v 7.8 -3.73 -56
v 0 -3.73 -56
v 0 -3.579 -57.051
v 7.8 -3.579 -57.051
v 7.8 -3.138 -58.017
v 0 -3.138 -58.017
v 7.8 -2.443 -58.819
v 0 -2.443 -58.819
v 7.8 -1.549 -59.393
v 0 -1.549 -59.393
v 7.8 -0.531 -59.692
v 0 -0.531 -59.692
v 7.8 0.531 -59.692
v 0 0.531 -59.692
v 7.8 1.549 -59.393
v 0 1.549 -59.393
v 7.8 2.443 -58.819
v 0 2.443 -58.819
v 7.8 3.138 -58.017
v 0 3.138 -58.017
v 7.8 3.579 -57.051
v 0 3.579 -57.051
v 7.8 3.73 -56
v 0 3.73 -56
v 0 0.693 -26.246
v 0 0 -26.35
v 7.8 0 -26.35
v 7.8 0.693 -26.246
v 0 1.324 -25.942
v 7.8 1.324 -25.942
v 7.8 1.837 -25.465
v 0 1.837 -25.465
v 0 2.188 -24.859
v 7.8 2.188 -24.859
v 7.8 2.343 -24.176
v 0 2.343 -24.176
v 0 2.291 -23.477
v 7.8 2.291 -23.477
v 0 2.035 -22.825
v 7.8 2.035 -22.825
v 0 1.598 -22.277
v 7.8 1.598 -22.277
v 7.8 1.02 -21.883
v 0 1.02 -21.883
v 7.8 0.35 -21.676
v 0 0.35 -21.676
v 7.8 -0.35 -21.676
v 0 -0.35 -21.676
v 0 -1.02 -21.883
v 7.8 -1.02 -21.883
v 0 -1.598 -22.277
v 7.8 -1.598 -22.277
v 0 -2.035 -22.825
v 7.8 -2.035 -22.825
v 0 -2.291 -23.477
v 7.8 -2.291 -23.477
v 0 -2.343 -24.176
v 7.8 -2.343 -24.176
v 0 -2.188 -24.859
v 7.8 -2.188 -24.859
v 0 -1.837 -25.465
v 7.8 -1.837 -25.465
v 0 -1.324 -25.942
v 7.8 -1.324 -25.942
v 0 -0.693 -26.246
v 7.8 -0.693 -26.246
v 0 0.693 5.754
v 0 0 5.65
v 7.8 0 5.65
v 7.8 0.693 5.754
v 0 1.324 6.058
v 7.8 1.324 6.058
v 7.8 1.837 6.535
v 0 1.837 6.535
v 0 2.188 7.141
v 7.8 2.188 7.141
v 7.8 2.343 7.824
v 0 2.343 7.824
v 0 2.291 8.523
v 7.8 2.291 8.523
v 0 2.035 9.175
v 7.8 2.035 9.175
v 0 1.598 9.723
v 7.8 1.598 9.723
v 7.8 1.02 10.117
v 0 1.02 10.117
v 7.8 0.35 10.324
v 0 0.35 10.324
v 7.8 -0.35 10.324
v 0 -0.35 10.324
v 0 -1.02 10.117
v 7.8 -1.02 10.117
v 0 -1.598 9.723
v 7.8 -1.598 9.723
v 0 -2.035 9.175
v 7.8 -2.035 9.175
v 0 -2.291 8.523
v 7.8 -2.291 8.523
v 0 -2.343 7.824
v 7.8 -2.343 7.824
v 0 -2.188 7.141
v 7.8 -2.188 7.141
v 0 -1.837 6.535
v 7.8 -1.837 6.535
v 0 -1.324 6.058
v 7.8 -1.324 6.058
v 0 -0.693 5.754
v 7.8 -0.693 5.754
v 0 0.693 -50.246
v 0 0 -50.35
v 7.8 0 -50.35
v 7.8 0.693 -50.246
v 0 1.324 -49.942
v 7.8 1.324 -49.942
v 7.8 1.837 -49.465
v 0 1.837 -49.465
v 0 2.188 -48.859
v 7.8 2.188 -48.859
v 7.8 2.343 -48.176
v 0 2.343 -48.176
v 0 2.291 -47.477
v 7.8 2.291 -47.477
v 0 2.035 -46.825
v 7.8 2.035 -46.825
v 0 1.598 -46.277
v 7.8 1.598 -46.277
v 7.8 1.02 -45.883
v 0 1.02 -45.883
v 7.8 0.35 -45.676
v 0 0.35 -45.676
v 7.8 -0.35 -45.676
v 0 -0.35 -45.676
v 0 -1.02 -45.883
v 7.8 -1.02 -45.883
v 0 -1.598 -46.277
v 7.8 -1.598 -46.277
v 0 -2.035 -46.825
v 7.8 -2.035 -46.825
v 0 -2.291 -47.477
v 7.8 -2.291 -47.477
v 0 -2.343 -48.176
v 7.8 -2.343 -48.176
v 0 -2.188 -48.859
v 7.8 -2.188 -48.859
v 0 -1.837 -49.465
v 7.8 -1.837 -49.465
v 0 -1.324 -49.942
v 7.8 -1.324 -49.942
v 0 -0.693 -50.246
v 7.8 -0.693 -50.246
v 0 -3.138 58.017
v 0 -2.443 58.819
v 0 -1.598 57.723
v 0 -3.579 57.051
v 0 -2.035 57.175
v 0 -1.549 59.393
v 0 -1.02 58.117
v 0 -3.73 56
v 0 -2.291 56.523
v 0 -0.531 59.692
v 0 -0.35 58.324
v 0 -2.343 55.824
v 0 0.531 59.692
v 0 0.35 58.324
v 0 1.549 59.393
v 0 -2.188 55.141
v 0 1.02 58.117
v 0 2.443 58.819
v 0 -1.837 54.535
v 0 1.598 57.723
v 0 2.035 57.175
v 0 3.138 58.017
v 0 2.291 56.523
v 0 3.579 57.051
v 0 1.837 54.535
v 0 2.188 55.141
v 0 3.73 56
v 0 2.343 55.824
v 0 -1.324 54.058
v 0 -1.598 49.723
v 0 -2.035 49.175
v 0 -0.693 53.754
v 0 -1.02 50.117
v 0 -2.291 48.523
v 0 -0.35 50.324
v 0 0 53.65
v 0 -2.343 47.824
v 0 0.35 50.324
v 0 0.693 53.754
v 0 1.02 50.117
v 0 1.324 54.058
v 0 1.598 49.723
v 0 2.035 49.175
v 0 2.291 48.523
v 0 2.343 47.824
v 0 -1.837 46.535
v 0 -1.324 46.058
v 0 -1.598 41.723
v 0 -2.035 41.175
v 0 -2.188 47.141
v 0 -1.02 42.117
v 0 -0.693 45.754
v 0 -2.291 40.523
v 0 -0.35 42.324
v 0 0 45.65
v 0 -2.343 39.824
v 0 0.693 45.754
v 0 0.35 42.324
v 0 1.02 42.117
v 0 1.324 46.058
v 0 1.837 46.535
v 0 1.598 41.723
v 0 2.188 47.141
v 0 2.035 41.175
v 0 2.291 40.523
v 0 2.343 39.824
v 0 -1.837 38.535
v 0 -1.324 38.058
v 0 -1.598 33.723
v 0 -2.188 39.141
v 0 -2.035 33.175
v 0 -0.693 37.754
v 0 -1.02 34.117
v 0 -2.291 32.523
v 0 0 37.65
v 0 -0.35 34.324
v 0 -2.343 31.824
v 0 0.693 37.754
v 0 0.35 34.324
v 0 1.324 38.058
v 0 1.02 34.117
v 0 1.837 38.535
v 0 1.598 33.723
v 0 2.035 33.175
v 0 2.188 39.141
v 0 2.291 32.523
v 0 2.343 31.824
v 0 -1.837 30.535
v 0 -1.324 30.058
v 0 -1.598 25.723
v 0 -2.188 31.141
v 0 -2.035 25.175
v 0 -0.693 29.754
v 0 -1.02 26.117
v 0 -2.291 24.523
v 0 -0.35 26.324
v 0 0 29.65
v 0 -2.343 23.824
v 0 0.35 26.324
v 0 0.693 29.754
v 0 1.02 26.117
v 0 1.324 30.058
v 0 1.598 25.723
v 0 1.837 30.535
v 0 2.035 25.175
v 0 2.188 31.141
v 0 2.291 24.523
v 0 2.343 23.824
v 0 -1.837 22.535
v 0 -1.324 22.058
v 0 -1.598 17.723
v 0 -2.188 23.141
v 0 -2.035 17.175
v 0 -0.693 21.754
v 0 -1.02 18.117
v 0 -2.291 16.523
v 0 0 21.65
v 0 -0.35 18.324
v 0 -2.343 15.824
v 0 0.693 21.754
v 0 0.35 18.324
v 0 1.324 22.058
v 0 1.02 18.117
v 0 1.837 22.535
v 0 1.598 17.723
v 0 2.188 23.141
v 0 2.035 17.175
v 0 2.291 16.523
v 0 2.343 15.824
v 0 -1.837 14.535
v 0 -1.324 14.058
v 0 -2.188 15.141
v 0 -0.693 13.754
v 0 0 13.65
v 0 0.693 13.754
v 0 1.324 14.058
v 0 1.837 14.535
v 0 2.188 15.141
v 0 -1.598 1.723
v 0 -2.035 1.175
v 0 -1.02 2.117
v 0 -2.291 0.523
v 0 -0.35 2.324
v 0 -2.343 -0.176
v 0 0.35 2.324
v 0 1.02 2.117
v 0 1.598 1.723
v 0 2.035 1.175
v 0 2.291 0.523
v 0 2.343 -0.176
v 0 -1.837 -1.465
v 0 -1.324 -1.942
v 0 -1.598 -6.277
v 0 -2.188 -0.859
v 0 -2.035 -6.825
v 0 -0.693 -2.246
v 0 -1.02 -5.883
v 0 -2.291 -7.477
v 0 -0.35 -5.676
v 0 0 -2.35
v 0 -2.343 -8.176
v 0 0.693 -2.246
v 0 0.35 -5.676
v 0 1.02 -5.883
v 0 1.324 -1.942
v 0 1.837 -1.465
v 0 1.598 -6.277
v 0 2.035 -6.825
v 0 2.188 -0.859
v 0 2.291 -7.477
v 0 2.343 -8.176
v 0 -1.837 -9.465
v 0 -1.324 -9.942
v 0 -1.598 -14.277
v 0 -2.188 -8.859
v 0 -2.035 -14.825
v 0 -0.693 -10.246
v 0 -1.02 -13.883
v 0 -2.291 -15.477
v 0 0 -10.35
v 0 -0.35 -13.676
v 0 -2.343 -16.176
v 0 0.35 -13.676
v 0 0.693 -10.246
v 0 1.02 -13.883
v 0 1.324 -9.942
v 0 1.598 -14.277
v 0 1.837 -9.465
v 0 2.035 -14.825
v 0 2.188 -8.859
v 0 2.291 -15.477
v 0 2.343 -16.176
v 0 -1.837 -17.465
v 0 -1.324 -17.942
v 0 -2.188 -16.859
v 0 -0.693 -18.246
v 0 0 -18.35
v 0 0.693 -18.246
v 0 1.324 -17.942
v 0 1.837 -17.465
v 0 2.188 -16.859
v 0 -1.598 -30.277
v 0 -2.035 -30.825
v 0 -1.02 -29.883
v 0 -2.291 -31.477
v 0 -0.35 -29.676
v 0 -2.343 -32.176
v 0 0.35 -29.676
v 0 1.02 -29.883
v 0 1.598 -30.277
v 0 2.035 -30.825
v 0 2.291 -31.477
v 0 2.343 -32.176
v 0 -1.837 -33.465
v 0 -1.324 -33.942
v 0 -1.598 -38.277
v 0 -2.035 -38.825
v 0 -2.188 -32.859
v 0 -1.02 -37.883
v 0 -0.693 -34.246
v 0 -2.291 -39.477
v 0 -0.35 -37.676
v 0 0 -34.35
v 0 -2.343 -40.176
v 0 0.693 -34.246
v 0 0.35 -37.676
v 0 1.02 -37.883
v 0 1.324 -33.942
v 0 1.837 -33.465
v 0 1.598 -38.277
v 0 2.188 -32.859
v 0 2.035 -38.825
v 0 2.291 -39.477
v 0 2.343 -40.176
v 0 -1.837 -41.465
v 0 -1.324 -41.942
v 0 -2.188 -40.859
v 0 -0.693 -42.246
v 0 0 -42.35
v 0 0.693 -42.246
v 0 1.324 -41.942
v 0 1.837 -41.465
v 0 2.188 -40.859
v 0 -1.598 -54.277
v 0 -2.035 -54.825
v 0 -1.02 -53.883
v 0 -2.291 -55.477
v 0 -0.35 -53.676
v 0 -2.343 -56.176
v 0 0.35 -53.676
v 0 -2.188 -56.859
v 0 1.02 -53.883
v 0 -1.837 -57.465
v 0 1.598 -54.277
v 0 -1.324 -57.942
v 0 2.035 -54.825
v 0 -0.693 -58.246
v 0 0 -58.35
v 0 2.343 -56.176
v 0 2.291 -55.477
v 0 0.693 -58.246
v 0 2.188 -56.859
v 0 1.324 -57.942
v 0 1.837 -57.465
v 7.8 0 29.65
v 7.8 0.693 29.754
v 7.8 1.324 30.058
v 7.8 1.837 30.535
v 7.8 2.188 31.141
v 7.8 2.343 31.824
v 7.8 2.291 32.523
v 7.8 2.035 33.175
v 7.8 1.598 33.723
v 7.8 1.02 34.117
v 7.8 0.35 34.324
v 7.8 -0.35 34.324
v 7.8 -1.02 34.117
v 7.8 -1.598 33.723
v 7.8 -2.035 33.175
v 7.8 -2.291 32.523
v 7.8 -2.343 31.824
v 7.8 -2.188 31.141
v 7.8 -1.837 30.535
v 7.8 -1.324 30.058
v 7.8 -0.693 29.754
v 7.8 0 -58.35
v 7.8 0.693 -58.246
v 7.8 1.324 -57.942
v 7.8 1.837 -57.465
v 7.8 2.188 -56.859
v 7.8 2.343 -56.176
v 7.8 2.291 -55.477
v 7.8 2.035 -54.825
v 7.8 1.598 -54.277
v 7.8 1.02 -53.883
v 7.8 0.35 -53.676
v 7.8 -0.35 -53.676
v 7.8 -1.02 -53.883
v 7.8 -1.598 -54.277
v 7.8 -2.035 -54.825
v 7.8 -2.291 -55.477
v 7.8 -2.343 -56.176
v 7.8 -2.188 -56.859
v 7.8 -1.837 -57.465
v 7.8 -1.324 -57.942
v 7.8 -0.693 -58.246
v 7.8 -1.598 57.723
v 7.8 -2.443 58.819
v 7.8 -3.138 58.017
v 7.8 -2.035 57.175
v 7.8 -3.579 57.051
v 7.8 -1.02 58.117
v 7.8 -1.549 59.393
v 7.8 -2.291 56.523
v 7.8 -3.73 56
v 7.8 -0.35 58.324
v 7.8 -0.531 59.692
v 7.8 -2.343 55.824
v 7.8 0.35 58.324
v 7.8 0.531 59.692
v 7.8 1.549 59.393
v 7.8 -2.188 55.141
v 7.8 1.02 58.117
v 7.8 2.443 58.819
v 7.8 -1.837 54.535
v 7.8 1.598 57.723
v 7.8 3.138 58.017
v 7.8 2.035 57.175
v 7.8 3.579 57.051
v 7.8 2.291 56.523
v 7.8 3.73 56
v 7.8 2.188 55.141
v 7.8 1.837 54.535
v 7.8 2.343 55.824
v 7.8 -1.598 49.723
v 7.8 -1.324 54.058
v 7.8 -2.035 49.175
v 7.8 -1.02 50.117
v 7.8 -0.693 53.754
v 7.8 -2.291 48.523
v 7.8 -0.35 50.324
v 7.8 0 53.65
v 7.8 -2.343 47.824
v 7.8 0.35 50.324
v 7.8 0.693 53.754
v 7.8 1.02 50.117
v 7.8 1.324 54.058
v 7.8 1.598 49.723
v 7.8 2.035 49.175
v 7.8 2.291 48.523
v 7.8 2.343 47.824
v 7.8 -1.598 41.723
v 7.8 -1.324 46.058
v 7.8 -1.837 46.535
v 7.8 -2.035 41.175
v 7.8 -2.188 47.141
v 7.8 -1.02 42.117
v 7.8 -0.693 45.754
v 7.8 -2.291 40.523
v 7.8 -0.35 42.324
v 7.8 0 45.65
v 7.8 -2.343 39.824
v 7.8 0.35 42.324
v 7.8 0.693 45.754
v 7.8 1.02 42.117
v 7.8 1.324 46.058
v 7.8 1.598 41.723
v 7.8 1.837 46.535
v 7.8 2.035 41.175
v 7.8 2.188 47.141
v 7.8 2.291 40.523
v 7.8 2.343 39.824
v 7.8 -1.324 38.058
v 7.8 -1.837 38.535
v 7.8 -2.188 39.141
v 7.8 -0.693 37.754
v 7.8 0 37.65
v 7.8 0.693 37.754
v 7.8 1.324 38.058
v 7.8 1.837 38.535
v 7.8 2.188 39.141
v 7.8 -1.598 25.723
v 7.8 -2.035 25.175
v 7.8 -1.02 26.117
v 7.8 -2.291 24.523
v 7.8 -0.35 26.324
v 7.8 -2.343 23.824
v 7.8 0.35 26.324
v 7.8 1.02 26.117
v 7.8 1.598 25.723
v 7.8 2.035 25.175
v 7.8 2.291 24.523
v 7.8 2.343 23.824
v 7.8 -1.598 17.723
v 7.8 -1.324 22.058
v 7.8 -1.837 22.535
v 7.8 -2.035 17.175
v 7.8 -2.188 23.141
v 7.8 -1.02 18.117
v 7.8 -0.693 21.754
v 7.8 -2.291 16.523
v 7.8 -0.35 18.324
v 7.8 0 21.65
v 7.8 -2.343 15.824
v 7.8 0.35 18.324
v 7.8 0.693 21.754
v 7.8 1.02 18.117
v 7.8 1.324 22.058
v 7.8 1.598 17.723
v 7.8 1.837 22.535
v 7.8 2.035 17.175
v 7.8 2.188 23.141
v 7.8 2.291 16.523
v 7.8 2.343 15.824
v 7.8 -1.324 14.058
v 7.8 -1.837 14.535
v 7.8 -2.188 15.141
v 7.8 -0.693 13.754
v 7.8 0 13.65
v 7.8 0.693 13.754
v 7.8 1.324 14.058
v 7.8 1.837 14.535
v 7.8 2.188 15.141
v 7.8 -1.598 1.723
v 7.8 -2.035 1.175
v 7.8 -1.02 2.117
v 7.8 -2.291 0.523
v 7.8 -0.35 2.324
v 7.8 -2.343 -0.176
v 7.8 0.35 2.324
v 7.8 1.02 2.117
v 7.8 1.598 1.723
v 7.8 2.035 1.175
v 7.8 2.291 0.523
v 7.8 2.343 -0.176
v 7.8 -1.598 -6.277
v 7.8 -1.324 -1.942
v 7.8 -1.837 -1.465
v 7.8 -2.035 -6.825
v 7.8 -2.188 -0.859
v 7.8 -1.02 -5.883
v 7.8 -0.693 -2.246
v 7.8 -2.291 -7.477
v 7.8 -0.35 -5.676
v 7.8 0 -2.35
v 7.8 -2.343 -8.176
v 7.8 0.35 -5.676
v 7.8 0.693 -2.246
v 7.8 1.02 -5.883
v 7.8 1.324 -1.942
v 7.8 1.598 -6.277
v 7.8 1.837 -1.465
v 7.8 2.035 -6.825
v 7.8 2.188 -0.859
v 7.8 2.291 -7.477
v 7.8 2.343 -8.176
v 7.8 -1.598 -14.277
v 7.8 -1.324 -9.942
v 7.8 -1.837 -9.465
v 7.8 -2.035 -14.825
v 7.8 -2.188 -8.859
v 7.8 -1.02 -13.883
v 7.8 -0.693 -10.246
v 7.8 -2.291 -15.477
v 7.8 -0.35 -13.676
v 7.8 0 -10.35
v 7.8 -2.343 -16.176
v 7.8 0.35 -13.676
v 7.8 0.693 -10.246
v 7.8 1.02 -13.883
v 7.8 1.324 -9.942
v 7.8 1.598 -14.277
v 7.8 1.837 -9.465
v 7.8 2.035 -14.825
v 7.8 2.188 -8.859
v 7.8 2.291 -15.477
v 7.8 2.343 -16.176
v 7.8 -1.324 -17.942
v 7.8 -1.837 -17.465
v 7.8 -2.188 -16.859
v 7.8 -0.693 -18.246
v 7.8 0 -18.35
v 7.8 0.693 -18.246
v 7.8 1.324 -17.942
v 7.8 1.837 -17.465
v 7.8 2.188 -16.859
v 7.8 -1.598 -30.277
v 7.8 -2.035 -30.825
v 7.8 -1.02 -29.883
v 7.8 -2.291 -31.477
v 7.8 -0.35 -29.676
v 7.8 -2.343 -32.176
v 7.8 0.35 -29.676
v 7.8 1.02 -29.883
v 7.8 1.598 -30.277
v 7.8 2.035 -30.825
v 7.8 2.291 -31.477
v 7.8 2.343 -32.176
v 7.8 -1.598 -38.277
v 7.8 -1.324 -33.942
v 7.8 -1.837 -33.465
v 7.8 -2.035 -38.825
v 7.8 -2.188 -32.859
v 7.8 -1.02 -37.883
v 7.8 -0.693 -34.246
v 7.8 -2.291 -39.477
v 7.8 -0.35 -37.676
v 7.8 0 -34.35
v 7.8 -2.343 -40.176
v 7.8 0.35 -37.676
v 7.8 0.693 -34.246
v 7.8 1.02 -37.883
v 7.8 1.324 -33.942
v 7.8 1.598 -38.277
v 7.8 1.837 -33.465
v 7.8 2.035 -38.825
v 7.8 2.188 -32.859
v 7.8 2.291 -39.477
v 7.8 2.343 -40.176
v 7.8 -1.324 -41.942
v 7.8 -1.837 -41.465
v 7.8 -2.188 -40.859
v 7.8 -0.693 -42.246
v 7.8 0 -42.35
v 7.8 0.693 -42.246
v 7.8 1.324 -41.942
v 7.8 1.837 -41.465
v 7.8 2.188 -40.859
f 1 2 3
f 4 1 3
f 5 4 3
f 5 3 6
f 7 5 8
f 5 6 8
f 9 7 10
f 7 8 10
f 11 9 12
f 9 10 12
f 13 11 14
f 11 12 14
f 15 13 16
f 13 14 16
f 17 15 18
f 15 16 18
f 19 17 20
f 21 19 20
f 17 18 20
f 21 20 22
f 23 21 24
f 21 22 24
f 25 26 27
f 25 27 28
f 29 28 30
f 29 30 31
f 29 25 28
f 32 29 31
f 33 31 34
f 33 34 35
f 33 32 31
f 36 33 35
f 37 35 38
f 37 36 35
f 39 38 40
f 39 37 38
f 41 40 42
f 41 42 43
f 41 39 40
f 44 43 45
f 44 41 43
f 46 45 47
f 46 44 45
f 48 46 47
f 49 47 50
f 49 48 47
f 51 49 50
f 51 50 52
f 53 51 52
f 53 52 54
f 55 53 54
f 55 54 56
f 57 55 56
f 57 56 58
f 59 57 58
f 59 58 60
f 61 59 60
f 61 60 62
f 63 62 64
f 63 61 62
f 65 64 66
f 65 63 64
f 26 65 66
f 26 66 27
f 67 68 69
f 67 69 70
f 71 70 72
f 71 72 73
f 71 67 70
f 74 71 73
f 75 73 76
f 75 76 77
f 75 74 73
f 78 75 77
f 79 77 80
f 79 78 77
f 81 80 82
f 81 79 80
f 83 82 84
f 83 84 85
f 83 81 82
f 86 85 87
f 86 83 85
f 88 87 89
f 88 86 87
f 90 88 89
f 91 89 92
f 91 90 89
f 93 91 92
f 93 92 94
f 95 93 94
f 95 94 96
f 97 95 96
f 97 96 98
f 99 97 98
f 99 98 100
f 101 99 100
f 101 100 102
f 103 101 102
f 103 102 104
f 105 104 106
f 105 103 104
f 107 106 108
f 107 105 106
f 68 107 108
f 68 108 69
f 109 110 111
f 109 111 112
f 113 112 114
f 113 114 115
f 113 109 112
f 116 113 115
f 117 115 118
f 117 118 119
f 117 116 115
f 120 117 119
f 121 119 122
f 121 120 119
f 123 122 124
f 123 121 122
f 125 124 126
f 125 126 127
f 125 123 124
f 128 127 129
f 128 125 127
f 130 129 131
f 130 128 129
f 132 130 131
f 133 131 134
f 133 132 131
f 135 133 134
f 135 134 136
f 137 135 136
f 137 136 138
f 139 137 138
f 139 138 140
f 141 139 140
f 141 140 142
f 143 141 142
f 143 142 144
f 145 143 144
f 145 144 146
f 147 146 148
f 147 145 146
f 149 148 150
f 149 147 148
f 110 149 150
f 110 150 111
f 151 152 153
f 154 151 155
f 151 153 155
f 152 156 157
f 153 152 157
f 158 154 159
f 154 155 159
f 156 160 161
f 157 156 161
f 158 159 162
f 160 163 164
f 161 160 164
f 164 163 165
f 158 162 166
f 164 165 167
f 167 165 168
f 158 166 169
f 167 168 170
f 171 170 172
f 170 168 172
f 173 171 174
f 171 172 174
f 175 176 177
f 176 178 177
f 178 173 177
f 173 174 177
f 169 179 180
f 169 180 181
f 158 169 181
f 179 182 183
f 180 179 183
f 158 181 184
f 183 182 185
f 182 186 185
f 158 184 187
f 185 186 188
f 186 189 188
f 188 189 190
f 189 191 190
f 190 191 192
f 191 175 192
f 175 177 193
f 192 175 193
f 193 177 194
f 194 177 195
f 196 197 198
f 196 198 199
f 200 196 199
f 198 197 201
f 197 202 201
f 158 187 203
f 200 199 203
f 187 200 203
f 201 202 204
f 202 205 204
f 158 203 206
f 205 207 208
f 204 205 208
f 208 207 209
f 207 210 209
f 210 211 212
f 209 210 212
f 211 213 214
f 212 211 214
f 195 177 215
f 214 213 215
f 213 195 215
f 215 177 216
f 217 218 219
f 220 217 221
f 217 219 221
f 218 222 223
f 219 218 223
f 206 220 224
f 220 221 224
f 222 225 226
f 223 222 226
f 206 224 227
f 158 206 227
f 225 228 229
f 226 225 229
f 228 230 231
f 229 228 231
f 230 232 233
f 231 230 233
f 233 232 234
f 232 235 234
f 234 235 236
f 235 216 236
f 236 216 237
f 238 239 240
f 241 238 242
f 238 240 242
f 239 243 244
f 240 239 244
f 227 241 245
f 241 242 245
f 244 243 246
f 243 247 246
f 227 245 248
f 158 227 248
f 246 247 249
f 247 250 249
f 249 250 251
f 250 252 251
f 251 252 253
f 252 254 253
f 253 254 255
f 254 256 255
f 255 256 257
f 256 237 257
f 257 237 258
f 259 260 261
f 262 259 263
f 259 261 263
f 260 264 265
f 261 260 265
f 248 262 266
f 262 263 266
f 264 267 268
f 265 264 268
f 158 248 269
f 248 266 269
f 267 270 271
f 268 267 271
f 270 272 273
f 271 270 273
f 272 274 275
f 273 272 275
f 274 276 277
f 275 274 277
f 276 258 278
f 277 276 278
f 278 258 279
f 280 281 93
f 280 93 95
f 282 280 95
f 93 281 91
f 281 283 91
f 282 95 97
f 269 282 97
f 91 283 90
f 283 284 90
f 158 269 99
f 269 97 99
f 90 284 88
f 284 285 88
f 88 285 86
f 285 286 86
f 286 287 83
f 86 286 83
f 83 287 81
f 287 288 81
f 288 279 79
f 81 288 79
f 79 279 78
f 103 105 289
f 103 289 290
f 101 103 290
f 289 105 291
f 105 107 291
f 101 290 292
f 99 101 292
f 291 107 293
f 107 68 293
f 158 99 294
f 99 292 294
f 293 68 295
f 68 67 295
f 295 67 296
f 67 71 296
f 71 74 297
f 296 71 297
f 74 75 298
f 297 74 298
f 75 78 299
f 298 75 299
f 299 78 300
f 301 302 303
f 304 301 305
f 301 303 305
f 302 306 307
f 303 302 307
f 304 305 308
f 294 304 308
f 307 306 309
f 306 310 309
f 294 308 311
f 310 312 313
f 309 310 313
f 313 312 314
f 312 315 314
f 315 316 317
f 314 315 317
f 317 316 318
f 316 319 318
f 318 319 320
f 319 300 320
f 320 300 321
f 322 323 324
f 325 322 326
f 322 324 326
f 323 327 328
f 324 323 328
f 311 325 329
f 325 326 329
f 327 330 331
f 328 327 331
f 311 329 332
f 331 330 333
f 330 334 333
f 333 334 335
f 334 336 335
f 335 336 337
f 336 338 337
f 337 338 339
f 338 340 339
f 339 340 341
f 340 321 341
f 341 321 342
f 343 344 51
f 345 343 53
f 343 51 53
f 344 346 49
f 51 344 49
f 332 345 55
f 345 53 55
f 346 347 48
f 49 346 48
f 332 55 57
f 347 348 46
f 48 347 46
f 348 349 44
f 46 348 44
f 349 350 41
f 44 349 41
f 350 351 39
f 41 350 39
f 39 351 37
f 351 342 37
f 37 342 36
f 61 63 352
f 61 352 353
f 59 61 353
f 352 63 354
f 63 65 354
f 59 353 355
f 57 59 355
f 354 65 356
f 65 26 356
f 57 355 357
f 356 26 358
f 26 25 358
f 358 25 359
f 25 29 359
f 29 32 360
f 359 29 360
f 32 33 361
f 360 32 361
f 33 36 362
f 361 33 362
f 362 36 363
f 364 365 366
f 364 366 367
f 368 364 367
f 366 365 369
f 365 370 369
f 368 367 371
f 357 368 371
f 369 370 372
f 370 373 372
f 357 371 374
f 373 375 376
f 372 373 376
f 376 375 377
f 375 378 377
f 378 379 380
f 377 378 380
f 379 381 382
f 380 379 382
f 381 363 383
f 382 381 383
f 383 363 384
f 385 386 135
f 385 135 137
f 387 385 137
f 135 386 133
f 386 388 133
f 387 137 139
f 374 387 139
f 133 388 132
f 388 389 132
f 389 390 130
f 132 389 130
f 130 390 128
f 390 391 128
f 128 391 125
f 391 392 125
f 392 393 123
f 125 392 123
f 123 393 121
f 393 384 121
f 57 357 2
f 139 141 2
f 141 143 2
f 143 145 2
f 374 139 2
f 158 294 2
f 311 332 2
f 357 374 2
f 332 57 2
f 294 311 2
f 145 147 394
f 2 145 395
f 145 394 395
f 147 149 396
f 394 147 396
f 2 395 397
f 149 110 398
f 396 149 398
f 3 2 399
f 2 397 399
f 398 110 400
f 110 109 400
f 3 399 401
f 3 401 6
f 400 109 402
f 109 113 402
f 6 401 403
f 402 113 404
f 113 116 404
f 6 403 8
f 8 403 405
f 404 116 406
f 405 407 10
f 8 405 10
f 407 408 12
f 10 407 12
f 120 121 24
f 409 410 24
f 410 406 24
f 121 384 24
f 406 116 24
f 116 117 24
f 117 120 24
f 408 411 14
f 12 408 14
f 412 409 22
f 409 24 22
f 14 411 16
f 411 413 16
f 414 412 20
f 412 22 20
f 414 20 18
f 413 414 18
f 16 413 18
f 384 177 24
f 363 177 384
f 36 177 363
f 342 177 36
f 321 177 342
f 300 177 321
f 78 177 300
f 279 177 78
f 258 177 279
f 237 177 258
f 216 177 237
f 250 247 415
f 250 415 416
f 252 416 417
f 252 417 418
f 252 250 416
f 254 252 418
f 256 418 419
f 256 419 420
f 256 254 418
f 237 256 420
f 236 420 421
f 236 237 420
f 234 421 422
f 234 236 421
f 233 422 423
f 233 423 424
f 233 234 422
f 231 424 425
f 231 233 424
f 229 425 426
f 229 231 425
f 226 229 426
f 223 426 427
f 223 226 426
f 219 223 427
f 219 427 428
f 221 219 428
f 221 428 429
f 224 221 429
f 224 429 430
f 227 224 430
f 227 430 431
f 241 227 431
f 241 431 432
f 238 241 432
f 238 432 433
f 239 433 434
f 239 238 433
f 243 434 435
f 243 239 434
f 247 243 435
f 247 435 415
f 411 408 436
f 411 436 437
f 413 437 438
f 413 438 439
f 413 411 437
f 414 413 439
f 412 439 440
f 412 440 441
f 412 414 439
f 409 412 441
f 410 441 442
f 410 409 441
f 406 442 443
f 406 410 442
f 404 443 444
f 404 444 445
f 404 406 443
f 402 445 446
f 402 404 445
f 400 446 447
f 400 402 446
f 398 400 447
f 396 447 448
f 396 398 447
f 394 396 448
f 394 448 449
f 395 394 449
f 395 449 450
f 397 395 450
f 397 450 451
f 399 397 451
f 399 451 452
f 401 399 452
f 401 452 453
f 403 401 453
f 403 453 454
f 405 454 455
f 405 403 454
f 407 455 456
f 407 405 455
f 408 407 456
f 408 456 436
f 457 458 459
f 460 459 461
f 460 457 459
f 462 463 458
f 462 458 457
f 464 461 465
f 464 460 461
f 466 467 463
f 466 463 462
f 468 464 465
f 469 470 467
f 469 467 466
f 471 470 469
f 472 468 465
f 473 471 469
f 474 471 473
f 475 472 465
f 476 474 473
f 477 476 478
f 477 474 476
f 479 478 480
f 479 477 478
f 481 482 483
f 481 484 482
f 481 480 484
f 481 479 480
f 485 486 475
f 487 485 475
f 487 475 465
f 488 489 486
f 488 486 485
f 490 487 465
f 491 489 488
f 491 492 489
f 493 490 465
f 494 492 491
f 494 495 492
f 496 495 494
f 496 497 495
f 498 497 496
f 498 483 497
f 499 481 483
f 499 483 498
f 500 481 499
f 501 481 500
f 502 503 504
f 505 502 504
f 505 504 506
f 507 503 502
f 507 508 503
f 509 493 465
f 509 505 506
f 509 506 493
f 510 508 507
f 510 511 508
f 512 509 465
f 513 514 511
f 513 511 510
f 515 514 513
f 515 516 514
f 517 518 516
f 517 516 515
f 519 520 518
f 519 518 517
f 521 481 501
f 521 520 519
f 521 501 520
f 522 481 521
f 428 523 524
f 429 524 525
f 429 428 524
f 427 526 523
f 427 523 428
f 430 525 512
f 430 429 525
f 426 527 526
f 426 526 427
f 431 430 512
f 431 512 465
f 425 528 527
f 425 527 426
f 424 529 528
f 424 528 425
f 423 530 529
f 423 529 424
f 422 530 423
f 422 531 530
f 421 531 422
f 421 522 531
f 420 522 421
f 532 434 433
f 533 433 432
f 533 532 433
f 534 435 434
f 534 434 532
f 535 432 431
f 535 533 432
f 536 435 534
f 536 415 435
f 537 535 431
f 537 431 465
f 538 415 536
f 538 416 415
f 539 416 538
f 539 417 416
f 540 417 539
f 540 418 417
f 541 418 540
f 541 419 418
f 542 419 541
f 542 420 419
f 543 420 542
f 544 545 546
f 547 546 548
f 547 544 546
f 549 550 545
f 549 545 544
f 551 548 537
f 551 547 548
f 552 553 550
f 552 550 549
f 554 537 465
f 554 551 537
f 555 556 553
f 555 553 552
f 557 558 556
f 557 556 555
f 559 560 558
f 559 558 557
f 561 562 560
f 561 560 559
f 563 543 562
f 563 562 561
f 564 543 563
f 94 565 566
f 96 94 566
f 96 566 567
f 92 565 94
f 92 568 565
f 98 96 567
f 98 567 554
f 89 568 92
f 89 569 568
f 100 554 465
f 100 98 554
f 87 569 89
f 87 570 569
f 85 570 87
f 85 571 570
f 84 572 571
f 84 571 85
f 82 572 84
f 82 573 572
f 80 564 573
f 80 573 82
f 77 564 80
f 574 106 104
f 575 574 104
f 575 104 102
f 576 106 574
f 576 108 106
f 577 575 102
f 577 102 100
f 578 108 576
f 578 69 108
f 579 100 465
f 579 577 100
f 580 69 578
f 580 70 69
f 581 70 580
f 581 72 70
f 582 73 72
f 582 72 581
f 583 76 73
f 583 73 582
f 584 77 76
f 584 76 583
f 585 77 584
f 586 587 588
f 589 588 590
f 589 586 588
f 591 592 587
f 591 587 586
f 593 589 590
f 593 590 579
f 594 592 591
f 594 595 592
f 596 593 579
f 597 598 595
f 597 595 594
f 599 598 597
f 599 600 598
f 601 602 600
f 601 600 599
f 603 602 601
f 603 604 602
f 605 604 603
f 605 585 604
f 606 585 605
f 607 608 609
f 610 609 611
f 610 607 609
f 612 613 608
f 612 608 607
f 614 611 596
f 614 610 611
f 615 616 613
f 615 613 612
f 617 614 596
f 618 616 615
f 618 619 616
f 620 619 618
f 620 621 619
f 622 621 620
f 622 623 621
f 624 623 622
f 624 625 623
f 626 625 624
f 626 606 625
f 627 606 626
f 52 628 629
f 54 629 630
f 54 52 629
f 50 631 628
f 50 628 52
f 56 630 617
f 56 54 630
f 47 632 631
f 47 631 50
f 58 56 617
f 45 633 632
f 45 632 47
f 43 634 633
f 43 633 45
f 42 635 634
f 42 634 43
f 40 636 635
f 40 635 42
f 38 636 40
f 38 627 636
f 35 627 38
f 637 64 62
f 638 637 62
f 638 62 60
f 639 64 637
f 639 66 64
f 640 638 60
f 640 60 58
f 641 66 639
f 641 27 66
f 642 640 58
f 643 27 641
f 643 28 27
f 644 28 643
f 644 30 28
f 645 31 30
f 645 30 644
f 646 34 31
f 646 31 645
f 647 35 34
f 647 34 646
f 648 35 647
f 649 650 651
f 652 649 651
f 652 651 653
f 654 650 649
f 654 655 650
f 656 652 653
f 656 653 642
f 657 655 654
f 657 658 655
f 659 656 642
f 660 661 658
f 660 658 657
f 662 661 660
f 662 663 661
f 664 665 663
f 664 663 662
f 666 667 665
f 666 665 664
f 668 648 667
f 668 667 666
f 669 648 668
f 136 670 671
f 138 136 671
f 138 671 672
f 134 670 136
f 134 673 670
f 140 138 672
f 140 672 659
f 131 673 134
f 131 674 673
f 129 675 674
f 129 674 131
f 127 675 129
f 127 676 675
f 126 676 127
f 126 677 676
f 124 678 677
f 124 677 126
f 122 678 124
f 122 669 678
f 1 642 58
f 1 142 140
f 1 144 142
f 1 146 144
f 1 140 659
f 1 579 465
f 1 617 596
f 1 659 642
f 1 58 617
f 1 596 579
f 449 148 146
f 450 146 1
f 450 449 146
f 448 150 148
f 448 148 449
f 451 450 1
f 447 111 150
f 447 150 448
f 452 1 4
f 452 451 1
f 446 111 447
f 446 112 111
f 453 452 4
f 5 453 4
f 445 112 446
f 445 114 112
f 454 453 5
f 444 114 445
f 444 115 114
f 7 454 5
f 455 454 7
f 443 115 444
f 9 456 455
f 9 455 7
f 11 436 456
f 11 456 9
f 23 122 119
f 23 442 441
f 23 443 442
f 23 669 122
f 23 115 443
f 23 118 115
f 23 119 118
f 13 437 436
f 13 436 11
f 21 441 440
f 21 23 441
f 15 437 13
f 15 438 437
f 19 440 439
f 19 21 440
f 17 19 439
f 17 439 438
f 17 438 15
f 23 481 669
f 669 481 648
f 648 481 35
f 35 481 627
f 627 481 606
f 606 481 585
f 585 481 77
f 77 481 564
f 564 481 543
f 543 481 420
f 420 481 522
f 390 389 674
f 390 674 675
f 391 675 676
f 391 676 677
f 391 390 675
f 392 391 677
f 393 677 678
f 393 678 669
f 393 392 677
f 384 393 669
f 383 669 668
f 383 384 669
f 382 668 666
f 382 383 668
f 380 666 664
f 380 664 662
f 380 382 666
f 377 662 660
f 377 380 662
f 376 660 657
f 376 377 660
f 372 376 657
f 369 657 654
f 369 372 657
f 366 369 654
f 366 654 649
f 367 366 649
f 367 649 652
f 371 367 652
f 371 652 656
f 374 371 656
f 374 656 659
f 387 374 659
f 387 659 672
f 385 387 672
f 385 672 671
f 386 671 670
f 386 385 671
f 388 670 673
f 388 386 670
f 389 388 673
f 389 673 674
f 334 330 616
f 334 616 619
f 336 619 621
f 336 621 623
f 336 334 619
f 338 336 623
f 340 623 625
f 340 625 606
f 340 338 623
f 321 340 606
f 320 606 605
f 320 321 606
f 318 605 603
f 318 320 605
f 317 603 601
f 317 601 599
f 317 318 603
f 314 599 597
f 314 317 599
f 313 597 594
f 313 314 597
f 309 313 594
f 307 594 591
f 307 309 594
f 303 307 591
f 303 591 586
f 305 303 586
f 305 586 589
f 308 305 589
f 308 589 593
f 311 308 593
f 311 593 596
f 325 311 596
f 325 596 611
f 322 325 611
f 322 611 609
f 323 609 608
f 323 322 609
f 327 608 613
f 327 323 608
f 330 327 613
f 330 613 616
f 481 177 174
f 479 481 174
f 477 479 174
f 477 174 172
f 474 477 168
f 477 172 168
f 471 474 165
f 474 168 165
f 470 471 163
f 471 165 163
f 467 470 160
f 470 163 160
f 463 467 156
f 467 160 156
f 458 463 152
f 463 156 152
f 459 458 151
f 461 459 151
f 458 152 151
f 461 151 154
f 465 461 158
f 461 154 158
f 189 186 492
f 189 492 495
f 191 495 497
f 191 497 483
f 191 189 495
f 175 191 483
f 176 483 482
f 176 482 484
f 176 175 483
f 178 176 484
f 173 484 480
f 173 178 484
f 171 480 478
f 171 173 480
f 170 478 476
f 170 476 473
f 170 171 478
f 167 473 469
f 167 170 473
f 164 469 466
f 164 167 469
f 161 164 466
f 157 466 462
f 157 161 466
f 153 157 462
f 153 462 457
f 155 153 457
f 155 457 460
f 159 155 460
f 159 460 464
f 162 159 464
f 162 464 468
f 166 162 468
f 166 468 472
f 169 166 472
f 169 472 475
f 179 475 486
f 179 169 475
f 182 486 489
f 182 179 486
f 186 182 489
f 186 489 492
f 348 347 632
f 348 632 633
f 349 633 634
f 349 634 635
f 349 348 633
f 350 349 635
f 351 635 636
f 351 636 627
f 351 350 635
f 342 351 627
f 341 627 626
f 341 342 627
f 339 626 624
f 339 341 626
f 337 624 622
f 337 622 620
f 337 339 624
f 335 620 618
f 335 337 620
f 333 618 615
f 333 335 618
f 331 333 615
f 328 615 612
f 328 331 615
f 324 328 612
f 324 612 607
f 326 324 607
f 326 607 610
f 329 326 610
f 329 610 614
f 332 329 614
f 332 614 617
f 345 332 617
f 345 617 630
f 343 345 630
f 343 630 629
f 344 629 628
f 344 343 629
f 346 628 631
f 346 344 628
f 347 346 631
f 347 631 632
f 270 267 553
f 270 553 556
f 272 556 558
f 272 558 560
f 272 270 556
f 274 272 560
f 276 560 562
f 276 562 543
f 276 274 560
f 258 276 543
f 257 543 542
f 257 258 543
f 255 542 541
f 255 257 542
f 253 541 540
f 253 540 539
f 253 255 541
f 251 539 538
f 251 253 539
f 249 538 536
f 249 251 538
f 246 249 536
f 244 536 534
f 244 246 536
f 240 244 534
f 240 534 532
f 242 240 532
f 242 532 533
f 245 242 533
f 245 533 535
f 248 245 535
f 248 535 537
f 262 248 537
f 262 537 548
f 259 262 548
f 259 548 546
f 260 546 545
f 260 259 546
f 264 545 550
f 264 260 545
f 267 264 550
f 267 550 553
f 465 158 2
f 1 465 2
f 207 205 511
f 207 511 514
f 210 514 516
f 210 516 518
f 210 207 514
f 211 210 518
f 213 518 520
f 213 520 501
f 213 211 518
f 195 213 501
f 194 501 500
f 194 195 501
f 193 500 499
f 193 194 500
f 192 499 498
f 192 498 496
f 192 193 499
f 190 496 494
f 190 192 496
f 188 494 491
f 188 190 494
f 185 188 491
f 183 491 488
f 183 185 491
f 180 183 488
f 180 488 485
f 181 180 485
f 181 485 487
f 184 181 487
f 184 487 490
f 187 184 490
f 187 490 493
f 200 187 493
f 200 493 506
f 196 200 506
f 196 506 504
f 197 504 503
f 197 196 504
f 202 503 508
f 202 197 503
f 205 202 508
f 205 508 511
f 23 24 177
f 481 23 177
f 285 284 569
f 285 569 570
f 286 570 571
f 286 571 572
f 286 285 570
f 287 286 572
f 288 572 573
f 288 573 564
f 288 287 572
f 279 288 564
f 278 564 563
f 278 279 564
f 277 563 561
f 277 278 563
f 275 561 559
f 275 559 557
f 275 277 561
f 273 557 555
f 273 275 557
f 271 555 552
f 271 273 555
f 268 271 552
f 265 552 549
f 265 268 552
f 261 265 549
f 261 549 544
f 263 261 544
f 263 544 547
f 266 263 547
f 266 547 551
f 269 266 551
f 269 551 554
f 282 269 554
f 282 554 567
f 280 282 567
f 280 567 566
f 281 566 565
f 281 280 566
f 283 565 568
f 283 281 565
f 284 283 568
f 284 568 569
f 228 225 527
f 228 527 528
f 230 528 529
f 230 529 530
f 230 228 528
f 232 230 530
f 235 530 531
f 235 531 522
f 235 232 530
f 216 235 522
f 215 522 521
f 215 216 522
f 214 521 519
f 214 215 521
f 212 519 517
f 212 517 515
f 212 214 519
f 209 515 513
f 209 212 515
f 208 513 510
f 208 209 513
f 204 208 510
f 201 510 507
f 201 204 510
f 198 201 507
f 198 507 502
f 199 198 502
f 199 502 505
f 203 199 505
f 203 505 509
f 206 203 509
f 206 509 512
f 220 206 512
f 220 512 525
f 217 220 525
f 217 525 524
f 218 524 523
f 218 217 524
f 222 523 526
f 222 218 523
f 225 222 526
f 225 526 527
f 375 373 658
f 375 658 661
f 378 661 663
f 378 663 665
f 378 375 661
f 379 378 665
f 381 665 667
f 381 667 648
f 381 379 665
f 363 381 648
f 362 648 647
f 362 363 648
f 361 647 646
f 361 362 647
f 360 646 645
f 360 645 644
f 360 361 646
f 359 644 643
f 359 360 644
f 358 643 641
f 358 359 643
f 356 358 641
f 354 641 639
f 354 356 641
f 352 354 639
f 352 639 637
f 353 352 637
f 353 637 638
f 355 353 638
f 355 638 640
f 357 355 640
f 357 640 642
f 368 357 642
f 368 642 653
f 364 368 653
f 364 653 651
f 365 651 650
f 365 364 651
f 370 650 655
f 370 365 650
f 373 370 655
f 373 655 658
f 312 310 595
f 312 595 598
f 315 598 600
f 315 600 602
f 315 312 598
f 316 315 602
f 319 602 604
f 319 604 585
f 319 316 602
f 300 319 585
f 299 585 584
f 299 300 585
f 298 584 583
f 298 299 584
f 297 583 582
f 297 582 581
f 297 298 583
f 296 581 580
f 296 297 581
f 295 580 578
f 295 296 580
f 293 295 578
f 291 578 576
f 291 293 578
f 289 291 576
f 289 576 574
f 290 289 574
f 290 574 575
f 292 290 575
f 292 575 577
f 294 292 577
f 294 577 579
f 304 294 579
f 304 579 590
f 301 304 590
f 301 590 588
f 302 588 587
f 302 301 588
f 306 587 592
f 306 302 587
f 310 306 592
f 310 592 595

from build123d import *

# Parameters (mm, degrees)
SKETCH1_R           = 2.35
BOSS_EXTRUDE1_DEPTH = 7.8


with BuildPart() as part:
    # Sketch1 → Boss-Extrude1 (new body)
    with BuildSketch(Plane(origin=(0, 0, 0), x_dir=(0, 0, -1), z_dir=(1, 0, 0))):
        with BuildLine():
            Line((-56, -3.73), (56, -3.73))
            ThreePointArc((56, -3.73), (59.73, 0), (56, 3.73))
            Line((56, 3.73), (-56, 3.73))
            ThreePointArc((-56, 3.73), (-59.73, 0), (-56, -3.73))
        make_face()
        with Locations((-56, 0)):
            Circle(SKETCH1_R, mode=Mode.SUBTRACT)
        with Locations((-48, 0)):
            Circle(SKETCH1_R, mode=Mode.SUBTRACT)
        with Locations((-40, 0)):
            Circle(SKETCH1_R, mode=Mode.SUBTRACT)
        with Locations((-32, 0)):
            Circle(SKETCH1_R, mode=Mode.SUBTRACT)
        with Locations((-24, 0)):
            Circle(SKETCH1_R, mode=Mode.SUBTRACT)
        with Locations((-16, 0)):
            Circle(SKETCH1_R, mode=Mode.SUBTRACT)
        with Locations((-8, 0)):
            Circle(SKETCH1_R, mode=Mode.SUBTRACT)
        Circle(SKETCH1_R, mode=Mode.SUBTRACT)
        with Locations((8, 0)):
            Circle(SKETCH1_R, mode=Mode.SUBTRACT)
        with Locations((16, 0)):
            Circle(SKETCH1_R, mode=Mode.SUBTRACT)
        with Locations((24, 0)):
            Circle(SKETCH1_R, mode=Mode.SUBTRACT)
        with Locations((32, 0)):
            Circle(SKETCH1_R, mode=Mode.SUBTRACT)
        with Locations((40, 0)):
            Circle(SKETCH1_R, mode=Mode.SUBTRACT)
        with Locations((48, 0)):
            Circle(SKETCH1_R, mode=Mode.SUBTRACT)
        with Locations((56, 0)):
            Circle(SKETCH1_R, mode=Mode.SUBTRACT)
    extrude(amount=BOSS_EXTRUDE1_DEPTH)


solid = part.part
